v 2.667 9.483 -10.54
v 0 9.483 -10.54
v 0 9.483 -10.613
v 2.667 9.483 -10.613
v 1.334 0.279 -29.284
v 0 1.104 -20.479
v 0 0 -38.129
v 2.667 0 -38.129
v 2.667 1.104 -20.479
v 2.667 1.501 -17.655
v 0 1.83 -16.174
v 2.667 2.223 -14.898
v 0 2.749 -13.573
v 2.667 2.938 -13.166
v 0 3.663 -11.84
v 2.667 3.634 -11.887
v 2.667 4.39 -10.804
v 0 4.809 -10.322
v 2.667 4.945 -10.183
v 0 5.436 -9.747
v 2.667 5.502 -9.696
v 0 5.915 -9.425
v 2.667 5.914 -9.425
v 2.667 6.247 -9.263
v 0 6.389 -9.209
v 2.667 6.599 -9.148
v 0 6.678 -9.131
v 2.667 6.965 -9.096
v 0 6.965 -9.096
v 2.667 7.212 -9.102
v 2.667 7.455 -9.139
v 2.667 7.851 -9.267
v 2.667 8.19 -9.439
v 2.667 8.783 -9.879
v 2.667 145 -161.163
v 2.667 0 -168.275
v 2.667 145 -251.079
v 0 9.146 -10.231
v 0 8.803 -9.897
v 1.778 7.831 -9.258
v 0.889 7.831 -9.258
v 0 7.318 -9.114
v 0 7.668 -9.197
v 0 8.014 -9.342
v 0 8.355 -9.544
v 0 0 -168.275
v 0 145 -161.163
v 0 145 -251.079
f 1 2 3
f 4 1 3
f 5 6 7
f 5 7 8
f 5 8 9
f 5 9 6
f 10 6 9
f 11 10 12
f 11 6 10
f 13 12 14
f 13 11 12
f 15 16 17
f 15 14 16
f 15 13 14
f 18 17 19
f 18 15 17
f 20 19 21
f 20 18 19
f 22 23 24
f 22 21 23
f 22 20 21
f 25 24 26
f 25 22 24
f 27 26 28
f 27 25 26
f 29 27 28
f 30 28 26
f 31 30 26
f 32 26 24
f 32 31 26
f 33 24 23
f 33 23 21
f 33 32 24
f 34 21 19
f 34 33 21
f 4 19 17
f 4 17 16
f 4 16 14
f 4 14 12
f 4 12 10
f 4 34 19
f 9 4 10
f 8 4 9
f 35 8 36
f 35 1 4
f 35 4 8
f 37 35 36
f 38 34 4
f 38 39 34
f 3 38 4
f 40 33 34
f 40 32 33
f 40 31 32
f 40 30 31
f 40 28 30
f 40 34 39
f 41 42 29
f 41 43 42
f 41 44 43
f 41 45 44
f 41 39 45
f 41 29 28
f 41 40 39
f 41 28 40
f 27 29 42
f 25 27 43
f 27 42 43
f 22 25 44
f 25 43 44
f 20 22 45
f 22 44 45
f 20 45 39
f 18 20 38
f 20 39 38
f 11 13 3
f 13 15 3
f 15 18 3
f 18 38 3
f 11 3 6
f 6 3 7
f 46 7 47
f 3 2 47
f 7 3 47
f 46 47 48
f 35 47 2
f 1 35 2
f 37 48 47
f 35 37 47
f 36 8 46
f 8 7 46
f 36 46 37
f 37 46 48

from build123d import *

# Parameters (mm, degrees)
BOSS_EXTRUDE1_DEPTH = 2.667
CUT_EXTRUDE1_DEPTH  = 290.953060218


with BuildPart() as part:
    # Sketch1 → Boss-Extrude1 (new body)
    with BuildSketch(Plane(origin=(0, 0, 0), x_dir=(0, 0, -1), z_dir=(1, 0, 0))):
        Polygon((0, 0), (168.275, 0), (251.079, 145), (161.163, 145), align=None)
    extrude(amount=BOSS_EXTRUDE1_DEPTH)

    # Sketch2 → Cut-Extrude1 (cut, through all)
    with BuildSketch(Plane.ZY):
        with BuildLine():
            Line((-38.268496776, -3.7413e-05), (1.603827089, -0.136652983))
            Line((1.603827089, -0.136652983), (-7.656991971, 9.482815094))
            Line((-7.656991971, 9.482815094), (-10.613049229, 9.482815094))
            add(Edge.make_bspline(
                [(-9.096096952, 6.965105301), (-9.056659473, 7.842017541), (-9.649957621, 8.686611456), (-10.613049229, 9.482815094)],
                knots=[0.095003114, 0.095003114, 0.095003114, 0.095003114, 0.122643686, 0.122643686, 0.122643686, 0.122643686], degree=3))
            add(Edge.make_bspline(
                [(-20.479171235, 1.104059742), (-19.78420669, 1.190866413), (-14.294371688, 1.692059126), (-9.186269713, 4.960068489), (-9.096096952, 6.965105301)],
                knots=[0, 0, 0, 0, 0.031803671, 0.095003114, 0.095003114, 0.095003114, 0.095003114], degree=3))
            add(Edge.make_bspline(
                [(-38.268496776, -3.7413e-05), (-29.333639406, -0.001953509), (-20.479171235, 1.104059742)],
                knots=[0, 0, 0, 1, 1, 1], degree=2))
        make_face()
    extrude(amount=-CUT_EXTRUDE1_DEPTH, mode=Mode.SUBTRACT)


solid = part.part
